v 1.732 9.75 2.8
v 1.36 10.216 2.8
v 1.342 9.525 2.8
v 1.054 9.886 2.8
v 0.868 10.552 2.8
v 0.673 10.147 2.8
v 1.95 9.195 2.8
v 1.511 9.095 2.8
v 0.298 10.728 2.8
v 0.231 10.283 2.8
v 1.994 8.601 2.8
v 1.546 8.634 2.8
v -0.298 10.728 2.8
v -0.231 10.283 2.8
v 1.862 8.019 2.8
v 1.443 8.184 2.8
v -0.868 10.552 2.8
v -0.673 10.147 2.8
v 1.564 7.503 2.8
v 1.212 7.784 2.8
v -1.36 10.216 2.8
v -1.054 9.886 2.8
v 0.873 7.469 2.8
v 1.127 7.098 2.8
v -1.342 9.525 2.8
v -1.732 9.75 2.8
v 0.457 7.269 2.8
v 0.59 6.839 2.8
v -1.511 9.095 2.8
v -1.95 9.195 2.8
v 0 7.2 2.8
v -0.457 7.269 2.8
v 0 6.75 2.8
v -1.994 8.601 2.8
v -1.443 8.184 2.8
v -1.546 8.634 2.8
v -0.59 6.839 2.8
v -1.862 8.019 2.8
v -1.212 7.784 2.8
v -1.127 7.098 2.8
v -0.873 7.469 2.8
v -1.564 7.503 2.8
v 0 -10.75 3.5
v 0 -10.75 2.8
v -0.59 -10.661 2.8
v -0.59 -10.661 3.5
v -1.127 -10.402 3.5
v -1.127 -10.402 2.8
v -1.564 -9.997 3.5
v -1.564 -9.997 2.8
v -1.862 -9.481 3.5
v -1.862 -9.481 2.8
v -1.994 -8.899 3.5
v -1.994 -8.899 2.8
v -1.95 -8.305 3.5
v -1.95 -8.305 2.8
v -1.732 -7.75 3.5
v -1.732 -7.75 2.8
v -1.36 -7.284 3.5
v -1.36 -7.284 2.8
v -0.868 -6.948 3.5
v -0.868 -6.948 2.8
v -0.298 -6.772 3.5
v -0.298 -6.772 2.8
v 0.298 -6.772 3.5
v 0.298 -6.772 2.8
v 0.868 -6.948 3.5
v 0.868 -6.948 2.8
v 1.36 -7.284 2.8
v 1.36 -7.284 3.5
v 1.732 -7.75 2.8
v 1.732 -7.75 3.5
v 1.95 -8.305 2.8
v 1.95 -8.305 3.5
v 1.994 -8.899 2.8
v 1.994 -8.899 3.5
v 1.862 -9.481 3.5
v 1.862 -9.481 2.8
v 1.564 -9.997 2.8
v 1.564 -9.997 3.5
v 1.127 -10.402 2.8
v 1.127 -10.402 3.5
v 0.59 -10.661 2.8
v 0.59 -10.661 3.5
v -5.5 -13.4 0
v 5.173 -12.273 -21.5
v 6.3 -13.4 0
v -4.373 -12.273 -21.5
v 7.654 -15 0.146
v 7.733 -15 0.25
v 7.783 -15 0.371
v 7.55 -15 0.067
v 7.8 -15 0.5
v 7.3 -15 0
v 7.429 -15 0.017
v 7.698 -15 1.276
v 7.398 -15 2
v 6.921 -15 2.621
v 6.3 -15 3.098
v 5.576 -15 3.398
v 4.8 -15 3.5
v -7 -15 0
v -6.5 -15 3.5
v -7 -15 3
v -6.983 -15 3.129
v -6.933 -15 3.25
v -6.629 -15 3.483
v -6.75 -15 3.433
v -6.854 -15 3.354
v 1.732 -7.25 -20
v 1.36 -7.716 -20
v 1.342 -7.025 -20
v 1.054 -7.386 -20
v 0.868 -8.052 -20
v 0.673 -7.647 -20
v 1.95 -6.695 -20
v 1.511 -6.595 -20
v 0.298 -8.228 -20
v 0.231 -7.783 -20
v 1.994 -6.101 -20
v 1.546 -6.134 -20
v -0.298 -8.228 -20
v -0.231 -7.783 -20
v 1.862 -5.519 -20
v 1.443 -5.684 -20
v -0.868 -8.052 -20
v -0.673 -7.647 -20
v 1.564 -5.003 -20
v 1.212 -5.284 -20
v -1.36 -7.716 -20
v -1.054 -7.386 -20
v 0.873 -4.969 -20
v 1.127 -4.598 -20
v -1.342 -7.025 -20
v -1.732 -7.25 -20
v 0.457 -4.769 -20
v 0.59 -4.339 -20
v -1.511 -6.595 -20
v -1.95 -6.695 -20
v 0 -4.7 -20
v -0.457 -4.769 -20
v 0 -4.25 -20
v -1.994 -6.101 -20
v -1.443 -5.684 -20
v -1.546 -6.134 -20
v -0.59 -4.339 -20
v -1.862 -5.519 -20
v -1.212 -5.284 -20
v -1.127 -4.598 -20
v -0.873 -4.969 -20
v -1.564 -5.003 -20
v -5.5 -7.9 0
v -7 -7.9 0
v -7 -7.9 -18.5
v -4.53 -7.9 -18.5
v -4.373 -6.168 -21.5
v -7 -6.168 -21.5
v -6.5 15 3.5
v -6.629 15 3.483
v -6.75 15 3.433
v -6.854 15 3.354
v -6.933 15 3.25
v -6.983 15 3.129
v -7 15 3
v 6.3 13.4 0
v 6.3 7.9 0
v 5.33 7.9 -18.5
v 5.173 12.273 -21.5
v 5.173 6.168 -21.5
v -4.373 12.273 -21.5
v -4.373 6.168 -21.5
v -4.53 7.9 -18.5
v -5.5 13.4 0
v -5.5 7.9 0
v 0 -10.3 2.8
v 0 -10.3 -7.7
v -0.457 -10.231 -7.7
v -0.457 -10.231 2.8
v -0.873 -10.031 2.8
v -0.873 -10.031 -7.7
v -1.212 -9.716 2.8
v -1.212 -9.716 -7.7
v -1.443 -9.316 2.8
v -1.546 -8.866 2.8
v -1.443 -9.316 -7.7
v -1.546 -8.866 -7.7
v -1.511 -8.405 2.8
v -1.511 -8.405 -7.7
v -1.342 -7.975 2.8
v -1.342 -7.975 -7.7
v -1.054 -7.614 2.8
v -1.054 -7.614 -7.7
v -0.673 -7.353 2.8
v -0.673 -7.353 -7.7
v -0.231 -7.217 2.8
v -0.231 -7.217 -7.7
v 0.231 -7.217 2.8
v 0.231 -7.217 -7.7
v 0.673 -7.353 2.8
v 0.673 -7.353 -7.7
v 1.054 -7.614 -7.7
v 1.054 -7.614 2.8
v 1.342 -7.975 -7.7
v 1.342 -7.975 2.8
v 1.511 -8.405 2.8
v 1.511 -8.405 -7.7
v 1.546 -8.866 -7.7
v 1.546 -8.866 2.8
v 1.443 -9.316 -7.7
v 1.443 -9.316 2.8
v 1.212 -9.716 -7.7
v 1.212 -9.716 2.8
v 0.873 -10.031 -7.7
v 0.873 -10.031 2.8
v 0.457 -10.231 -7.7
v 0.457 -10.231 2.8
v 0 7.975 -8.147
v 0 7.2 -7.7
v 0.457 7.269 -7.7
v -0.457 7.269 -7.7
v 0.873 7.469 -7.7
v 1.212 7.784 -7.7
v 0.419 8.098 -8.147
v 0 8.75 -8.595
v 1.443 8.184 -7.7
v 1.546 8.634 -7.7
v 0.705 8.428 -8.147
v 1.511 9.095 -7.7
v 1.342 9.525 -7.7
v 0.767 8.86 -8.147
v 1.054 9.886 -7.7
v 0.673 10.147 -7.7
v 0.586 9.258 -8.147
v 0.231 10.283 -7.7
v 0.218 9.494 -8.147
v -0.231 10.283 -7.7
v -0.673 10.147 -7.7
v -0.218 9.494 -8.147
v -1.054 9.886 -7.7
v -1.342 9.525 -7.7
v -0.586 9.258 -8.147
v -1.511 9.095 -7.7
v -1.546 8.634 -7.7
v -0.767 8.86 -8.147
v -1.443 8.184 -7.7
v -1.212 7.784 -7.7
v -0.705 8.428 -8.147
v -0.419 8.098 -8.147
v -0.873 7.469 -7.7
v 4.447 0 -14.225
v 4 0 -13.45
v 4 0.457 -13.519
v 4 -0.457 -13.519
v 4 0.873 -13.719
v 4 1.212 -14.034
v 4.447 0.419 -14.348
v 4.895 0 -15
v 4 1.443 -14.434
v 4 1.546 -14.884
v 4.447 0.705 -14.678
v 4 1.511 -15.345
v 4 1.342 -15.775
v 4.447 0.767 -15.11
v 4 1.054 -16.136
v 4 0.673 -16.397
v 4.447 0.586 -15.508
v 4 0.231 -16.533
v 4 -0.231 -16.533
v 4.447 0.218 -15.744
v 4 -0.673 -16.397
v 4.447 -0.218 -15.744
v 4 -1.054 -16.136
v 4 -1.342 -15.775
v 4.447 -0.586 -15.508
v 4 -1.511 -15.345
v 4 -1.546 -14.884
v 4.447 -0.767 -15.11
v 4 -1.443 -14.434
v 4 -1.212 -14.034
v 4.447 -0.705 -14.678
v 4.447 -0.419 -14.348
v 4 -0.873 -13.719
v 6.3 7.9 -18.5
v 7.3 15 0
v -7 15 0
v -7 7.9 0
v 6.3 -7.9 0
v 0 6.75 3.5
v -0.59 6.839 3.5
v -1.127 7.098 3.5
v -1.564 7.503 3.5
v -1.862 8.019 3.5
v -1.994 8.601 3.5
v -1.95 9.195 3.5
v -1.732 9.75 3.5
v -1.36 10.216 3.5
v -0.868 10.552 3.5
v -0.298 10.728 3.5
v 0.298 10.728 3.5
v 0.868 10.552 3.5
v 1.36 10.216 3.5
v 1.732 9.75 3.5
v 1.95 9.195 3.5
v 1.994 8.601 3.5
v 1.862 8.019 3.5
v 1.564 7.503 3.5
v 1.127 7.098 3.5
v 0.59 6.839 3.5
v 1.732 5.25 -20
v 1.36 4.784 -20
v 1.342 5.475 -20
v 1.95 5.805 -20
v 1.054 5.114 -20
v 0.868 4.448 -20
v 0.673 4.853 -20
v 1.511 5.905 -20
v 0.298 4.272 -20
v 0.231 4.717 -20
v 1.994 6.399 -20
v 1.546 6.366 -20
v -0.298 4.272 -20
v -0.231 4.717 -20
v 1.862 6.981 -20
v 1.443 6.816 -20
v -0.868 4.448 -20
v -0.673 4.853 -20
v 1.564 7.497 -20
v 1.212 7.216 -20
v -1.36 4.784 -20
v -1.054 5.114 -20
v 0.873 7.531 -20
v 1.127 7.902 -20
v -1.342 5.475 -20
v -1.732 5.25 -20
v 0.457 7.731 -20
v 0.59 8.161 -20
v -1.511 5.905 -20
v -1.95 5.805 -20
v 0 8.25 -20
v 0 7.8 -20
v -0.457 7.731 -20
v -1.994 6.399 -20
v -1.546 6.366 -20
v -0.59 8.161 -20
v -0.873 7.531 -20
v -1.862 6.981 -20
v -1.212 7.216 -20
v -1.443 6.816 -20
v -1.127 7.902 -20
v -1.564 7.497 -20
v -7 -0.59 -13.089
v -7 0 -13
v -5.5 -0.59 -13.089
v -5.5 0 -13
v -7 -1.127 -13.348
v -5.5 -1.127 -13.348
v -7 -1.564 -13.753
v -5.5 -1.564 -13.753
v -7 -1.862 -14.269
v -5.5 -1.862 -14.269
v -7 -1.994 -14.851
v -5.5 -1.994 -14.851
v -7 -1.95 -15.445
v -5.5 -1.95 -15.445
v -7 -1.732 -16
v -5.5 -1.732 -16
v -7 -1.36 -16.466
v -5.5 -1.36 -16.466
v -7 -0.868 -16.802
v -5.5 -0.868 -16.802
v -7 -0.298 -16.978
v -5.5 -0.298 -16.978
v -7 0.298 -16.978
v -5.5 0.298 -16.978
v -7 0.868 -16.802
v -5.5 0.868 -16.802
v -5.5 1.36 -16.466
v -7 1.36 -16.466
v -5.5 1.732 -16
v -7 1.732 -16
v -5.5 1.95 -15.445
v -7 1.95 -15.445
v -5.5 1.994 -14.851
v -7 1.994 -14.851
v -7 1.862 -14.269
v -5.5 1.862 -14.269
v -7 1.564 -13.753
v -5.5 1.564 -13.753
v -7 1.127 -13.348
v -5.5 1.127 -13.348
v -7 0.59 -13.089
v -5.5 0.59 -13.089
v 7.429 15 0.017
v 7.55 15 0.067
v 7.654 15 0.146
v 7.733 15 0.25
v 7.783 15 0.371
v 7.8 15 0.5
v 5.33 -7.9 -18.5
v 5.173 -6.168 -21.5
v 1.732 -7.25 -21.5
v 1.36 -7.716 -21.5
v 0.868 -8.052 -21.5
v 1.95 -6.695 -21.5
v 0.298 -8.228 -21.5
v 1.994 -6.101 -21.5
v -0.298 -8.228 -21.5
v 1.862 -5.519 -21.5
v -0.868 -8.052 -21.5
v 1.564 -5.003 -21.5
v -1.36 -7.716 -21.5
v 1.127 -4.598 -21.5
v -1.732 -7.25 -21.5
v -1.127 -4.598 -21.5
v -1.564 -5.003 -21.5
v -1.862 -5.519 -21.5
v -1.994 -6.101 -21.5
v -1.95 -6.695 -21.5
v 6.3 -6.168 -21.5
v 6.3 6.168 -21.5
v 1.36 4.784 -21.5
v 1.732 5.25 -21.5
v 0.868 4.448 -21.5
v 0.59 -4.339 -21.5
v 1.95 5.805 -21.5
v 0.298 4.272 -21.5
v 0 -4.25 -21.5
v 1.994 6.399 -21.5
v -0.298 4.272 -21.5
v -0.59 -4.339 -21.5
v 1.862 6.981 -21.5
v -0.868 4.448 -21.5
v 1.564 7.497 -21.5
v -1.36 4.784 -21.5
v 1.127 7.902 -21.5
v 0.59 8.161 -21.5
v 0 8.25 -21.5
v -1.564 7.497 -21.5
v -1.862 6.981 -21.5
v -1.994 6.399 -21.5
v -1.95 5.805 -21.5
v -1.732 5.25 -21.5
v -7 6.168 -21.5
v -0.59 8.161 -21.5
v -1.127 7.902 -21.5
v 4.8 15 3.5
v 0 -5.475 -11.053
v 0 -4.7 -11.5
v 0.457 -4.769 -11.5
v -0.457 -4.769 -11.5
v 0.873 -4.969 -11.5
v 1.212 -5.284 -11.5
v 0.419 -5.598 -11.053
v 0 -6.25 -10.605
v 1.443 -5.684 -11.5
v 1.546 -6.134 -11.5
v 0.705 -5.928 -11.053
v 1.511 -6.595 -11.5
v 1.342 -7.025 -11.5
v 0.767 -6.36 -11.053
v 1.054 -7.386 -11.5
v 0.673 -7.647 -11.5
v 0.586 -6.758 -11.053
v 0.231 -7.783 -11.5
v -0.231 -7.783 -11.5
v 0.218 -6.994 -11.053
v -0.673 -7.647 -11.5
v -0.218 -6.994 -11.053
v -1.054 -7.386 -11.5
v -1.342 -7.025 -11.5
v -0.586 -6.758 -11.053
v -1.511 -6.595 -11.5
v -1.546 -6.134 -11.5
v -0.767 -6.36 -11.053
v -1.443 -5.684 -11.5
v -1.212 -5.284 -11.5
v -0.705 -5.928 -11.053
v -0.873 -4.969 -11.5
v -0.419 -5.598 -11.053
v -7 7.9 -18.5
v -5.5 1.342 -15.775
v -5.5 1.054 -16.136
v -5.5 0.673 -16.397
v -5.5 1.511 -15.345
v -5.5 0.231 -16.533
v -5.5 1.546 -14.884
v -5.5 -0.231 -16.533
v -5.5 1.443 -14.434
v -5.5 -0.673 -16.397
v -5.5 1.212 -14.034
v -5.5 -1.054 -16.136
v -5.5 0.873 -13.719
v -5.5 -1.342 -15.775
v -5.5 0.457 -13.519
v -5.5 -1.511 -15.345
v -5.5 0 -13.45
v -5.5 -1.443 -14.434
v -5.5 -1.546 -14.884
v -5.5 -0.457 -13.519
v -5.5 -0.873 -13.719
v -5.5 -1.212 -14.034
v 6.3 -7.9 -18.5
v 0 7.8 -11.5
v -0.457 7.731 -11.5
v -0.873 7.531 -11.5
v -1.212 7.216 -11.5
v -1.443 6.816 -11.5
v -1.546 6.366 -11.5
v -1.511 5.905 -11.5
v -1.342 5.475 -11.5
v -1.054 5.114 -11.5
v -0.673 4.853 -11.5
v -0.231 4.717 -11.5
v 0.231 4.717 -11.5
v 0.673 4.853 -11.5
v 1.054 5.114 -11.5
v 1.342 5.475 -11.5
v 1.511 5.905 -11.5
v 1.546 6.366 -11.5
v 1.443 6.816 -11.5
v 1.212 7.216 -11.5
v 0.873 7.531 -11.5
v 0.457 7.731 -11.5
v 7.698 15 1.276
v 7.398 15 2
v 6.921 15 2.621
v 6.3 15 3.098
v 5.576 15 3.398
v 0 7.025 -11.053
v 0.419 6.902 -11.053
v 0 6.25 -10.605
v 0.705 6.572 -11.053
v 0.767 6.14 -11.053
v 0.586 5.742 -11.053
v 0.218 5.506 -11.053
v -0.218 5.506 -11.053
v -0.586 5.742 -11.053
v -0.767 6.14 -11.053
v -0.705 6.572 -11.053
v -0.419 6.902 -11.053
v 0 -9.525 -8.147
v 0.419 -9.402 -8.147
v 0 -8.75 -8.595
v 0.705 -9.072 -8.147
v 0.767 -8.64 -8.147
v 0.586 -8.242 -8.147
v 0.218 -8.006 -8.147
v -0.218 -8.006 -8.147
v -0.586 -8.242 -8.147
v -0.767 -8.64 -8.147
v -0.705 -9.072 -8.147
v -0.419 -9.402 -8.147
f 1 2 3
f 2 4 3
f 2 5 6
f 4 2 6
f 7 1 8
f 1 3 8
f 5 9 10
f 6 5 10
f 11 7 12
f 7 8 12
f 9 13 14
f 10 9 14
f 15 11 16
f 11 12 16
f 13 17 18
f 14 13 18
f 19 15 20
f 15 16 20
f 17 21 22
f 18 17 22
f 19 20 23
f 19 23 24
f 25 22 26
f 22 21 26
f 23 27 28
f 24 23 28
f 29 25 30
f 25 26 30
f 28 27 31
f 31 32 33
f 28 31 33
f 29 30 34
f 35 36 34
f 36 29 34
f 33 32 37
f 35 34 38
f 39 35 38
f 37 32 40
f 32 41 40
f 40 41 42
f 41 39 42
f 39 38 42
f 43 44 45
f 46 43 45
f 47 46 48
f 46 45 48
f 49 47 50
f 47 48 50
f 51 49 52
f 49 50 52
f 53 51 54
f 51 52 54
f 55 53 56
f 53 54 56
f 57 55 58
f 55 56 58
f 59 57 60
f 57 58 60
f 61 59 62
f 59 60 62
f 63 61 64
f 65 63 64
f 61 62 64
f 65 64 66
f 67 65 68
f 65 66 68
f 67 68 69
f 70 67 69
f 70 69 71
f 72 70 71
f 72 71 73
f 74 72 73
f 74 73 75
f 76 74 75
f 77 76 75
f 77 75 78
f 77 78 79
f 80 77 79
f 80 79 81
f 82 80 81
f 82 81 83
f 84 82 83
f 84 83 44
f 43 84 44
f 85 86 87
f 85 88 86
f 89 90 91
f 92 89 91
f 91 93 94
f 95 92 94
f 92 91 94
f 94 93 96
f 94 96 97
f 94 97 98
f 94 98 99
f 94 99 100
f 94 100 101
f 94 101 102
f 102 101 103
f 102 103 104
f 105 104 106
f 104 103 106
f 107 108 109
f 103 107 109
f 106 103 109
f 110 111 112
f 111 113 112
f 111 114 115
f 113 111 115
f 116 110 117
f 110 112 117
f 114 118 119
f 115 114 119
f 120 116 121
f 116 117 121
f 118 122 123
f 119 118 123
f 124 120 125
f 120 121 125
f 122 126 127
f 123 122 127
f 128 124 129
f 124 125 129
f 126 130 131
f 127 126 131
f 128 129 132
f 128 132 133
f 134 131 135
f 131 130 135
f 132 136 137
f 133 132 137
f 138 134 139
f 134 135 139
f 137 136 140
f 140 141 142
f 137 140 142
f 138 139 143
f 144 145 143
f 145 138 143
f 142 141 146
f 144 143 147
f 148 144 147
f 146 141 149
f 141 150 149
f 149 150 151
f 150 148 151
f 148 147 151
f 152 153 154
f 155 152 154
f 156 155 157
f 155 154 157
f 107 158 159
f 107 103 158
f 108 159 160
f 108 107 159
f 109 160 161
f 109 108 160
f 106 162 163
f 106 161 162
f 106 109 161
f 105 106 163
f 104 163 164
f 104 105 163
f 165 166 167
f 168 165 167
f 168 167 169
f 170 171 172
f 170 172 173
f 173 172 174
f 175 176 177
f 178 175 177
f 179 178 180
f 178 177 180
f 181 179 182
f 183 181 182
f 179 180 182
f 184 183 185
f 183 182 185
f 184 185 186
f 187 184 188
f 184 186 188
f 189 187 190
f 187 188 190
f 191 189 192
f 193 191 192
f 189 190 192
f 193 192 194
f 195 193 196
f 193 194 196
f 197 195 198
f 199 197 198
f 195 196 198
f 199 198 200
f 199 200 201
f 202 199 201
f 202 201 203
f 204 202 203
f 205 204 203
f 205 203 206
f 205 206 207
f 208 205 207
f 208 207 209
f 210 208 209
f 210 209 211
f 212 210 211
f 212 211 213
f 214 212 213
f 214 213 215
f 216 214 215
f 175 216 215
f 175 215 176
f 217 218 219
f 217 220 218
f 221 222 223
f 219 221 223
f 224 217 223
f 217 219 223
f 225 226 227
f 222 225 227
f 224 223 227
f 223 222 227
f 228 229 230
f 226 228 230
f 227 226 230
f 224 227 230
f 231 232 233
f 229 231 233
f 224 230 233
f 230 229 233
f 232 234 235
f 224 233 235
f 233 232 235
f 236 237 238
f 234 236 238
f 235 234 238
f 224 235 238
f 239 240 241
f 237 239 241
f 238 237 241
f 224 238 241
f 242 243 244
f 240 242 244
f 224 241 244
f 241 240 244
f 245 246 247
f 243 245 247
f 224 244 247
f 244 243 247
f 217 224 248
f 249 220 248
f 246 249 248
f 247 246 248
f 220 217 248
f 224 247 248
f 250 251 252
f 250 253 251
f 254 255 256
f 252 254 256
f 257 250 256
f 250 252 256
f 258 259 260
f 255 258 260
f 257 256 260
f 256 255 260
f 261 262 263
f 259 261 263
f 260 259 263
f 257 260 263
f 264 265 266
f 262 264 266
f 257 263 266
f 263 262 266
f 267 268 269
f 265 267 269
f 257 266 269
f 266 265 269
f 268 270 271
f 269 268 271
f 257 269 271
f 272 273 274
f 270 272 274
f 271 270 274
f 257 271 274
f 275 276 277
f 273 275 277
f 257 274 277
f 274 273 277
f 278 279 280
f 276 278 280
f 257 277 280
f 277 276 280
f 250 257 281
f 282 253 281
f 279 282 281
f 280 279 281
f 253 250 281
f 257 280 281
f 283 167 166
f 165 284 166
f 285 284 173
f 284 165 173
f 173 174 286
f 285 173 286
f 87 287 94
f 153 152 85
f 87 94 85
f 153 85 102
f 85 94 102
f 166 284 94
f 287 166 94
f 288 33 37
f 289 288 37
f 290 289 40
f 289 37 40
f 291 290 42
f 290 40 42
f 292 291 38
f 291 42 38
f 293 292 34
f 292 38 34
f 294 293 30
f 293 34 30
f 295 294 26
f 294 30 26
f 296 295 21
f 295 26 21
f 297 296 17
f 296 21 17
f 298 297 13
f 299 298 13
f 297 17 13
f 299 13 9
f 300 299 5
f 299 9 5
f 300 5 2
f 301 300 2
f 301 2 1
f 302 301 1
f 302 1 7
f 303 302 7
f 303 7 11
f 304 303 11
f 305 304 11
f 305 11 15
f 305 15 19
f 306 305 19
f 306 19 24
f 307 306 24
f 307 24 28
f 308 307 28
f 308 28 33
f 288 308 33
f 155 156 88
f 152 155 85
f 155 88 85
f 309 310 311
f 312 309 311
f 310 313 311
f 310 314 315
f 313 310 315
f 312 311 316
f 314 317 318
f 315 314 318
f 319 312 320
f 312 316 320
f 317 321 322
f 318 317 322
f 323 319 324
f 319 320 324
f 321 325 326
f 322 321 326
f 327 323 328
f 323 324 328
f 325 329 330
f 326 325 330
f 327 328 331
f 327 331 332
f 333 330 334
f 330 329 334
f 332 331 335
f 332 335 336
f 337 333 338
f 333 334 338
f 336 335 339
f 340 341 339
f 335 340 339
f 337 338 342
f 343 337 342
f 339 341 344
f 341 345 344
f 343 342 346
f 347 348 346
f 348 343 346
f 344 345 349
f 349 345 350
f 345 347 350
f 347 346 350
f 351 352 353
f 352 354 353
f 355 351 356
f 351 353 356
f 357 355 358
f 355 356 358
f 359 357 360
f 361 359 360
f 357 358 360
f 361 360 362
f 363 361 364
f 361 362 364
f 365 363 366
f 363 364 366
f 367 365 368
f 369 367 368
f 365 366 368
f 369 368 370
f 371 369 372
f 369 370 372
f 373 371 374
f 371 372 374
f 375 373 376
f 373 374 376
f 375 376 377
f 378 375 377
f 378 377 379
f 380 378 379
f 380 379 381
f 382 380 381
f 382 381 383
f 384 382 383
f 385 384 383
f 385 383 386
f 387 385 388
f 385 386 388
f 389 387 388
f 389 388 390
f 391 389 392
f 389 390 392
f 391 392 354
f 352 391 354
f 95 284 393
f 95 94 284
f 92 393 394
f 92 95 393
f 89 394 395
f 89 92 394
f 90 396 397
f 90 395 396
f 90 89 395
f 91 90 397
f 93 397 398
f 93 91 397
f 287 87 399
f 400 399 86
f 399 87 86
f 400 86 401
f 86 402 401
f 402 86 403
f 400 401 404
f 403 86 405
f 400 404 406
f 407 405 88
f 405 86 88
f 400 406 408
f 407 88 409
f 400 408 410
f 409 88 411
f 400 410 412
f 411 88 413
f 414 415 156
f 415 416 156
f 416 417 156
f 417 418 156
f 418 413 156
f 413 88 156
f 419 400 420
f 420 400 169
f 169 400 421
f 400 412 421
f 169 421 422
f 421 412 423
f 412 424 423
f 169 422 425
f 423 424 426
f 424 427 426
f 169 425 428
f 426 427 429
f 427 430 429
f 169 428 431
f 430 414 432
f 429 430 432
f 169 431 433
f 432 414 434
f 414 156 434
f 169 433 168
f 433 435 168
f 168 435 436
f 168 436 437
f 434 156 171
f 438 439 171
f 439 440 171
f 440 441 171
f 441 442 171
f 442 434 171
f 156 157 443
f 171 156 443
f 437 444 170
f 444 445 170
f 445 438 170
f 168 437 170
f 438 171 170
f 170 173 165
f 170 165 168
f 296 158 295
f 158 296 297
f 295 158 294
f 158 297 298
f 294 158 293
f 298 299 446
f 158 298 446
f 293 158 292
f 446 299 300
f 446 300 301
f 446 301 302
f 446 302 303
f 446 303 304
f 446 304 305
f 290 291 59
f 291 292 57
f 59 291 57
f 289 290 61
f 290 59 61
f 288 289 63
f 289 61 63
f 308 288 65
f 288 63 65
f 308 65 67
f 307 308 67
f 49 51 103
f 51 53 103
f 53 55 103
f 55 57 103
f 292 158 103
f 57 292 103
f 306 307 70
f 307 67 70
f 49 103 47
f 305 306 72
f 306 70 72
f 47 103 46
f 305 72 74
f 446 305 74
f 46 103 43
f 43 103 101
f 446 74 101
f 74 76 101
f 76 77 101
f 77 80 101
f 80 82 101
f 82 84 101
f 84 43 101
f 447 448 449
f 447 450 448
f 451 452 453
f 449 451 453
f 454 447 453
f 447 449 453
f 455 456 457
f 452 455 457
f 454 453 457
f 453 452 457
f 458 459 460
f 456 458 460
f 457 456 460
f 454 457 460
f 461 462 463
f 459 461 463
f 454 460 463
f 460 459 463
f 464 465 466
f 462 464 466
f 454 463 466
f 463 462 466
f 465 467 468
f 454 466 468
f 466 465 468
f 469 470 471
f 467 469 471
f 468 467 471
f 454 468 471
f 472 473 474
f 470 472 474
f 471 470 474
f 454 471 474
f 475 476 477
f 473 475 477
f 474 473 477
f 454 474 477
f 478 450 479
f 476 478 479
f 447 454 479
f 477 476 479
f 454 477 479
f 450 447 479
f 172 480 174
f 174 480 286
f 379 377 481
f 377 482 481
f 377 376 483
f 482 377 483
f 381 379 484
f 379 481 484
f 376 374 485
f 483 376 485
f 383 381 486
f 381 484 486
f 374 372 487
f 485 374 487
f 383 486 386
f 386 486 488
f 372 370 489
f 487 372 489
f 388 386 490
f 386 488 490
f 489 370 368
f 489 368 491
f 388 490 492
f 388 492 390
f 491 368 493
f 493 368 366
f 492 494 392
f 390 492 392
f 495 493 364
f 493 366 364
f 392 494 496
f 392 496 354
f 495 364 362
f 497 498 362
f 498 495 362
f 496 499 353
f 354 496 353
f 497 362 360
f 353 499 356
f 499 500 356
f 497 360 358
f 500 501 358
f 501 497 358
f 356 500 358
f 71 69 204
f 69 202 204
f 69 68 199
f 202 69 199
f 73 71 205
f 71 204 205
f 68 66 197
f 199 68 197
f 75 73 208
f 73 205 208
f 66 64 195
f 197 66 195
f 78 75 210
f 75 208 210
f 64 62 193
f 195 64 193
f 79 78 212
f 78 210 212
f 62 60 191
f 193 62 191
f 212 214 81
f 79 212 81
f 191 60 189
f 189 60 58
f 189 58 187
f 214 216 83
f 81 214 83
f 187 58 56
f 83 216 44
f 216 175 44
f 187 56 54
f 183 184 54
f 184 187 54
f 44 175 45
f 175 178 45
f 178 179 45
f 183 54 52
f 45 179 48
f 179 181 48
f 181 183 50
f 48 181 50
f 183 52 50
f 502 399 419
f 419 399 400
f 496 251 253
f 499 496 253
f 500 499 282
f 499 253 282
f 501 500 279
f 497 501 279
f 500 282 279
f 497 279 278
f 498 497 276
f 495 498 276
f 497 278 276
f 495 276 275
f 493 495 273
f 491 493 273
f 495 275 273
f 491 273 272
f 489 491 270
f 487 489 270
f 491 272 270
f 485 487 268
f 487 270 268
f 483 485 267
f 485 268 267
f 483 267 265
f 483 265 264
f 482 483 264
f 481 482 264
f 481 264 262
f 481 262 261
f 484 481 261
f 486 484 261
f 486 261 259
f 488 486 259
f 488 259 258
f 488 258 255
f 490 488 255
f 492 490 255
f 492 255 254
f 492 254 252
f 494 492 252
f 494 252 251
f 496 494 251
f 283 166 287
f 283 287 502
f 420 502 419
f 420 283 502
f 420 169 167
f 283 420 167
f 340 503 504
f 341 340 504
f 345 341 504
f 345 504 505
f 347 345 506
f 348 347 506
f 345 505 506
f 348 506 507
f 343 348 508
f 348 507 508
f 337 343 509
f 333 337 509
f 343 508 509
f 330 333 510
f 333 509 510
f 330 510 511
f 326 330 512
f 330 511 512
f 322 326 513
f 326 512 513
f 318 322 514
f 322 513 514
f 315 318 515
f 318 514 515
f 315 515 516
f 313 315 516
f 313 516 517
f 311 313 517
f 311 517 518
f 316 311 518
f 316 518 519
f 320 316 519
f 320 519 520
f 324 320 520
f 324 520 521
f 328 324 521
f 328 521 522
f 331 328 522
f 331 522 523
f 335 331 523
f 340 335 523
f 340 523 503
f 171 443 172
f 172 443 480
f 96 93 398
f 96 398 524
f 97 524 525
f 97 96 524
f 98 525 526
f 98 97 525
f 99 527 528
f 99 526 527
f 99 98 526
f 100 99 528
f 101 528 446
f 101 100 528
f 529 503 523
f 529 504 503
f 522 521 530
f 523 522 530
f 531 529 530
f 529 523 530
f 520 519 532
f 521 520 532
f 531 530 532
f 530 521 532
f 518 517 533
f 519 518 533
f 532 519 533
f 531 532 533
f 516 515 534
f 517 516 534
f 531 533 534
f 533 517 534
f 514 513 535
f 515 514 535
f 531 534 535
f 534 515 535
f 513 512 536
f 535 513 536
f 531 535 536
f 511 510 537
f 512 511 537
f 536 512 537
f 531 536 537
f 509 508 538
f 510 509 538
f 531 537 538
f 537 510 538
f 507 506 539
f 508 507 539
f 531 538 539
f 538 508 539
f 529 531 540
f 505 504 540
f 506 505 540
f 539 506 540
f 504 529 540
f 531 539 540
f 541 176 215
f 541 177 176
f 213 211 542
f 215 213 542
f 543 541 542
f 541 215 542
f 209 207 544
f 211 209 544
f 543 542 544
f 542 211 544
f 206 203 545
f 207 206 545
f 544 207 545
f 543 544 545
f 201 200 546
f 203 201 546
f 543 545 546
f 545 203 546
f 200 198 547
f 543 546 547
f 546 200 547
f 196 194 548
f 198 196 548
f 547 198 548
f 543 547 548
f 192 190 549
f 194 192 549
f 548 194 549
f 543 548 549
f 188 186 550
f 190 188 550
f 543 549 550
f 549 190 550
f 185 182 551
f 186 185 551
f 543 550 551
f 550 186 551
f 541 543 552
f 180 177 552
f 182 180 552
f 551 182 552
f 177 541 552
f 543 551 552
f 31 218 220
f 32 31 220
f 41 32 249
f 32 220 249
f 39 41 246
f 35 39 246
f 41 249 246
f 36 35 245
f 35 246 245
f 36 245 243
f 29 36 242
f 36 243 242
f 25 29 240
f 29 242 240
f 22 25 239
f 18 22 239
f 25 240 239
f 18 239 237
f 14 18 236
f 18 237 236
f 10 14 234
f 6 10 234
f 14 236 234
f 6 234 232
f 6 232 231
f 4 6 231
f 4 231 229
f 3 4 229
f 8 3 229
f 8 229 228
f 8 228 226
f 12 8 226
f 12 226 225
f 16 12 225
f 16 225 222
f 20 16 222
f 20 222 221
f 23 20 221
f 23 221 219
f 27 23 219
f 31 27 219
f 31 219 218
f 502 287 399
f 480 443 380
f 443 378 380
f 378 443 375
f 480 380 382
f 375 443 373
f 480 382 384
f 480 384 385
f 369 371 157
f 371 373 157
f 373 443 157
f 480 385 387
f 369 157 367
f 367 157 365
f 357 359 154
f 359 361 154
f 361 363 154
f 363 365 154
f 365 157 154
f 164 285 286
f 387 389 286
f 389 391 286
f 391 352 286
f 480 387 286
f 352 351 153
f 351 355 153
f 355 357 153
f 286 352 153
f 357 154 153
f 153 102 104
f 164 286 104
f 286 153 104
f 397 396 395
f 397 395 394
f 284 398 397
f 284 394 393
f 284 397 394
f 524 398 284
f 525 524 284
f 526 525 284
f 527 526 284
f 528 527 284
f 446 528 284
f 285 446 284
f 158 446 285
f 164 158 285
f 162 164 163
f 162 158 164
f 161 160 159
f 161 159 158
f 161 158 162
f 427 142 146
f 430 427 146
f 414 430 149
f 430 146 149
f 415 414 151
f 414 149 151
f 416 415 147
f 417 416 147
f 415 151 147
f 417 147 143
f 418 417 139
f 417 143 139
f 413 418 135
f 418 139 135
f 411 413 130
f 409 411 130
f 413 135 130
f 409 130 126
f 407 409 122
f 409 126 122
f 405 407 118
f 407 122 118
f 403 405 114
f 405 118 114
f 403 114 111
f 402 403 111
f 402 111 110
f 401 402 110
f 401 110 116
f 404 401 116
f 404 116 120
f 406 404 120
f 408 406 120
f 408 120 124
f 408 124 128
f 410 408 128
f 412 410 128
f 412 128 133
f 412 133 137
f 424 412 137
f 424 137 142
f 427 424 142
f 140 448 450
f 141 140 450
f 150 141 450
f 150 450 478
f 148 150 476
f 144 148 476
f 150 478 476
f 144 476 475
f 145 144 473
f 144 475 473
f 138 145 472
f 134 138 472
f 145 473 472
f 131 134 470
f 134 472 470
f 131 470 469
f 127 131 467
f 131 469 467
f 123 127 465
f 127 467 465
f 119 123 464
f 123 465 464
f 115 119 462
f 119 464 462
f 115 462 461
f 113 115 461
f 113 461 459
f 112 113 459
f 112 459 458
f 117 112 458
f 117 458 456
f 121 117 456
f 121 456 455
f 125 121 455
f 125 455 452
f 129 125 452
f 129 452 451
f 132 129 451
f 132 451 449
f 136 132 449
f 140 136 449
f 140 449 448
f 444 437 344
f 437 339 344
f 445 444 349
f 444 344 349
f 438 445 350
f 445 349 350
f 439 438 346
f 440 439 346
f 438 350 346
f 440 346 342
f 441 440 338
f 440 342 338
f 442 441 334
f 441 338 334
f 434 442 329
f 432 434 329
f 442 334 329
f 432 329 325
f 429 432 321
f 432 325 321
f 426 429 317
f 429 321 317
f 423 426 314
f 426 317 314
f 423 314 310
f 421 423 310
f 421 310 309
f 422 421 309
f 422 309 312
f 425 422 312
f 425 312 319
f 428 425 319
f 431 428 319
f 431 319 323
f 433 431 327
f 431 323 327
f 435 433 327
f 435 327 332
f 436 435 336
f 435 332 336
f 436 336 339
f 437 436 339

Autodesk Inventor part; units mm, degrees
sketch "Sketch_1" plane through (0, 0, 0) normal (0, 1, 0) x (-1, 0, 0)
  line L0 (5.5, 0) -> (-6.3, 0)
  line L1 (-6.3, 0) -> (-5.1732, -21.5)
  line L2 (-5.1732, -21.5) -> (4.3732, -21.5)
  line L3 (4.3732, -21.5) -> (5.5, 0)
extrude "Extrusion1" add sketch "Sketch_1" along normal mid plane 26.8
sketch "Sketch_2" plane through (0, 0, 0) normal (1, 0, 0) x (0, 1, 0)
  line L0 (13.4, 0) -> (12.2732, -21.5)
  line L1 (12.2732, -21.5) -> (-12.2732, -21.5)
  line L2 (-12.2732, -21.5) -> (-13.4, 0)
  line L3 (-13.4, 0) -> (-15, 0)
  line L4 (-15, 0) -> (-15, -25)
  line L5 (-15, -25) -> (15, -25)
  line L6 (15, -25) -> (15, 0)
  line L7 (15, 0) -> (13.4, 0)
extrude "Extrusion2" cut sketch "Sketch_2" along normal mid plane 13
sketch "Sketch_3" plane through (-7, 0, 0) normal (1, 0, 0) x (0, 0, -1)
  line L0 (0, -7.9) -> (18.5, -7.9)
  line L1 (18.5, -7.9) -> (21.5, -6.1679)
  line L2 (21.5, -6.1679) -> (21.5, 6.1679)
  line L3 (21.5, 6.1679) -> (18.5, 7.9)
  line L4 (18.5, 7.9) -> (0, 7.9)
  line L5 (0, 7.9) -> (0, -7.9)
extrude "Extrusion3" add sketch "Sketch_3" along normal blind 13.3
sketch "Sketch_4" plane through (0, 0, 0) normal (0, 1, 0) x (-1, 0, 0)
  line L0 (7, 0) -> (7, 3)
  arc A0 (7, 3) -> (6.5, 3.5) centre (6.5, 3) ccw
  line L1 (6.5, 3.5) -> (-4.8, 3.5)
  arc A1 (-4.8, 3.5) -> (-7.8, 0.5) centre (-4.8, 0.5) ccw
  arc A2 (-7.8, 0.5) -> (-7.3, 0) centre (-7.3, 0.5) ccw
  line L2 (-7.3, 0) -> (7, 0)
extrude "Extrusion4" add sketch "Sketch_4" along normal mid plane 30
sketch "Sketch5" plane through (-6.5, 15, 3.5) normal (0, 0, 1) x (1, 0, 0)
  point P0 (6.5, -6.25)
hole "Drilling 1" at (0, 8.75, 3.5) direction (0, 0, -1) diameter 3.1 depth 11.2 tip angle 120 counterbore diameter 4 counterbore depth 0.7
sketch "Sketch6" plane through (-6.5, 15, 3.5) normal (0, 0, 1) x (1, 0, 0)
  point P0 (6.5, -23.75)
hole "Drilling 2" at (0, -8.75, 3.5) direction (0, 0, -1) diameter 3.1 depth 11.2 tip angle 120 counterbore diameter 4 counterbore depth 0.7
sketch "Sketch7" plane through (5.1732, 12.2732, -21.5) normal (0, 0, -1) x (-1, 0, 0)
  point P0 (5.1732, -6.0232)
hole "Drilling 3" at (0, 6.25, -21.5) direction (0, 0, 1) diameter 3.1 depth 10 tip angle 120 counterbore diameter 4 counterbore depth 1.5
sketch "Sketch8" plane through (5.1732, 12.2732, -21.5) normal (0, 0, -1) x (-1, 0, 0)
  point P0 (5.1732, -18.5232)
hole "Drilling 4" at (0, -6.25, -21.5) direction (0, 0, 1) diameter 3.1 depth 10 tip angle 120 counterbore diameter 4 counterbore depth 1.5
sketch "Sketch9" plane through (-7, 0, 0) normal (-1, 0, 0) x (0, 0, 1)
  point P0 (-15, 0)
hole "Drilling 5" at (-7, 0, -15) direction (1, 0, 0) diameter 3.1 depth 11 tip angle 120 counterbore diameter 4 counterbore depth 1.5
ref_plane "montageblocke_XY" through (0, -8.75, 3.5) normal (0, 0, 1) x (1, 0, 0)
ref_plane "montageblocke_YZ" through (0, -8.75, 3.5) normal (1, 0, 0) x (0, 1, 0)
ref_plane "montageblocke_ZX" through (0, -8.75, 3.5) normal (0, 1, 0) x (0, 0, 1)
ref_plane "montageblocke_2_XY" through (0, 8.75, 3.5) normal (0, 0, 1) x (1, 0, 0)
ref_plane "montageblocke_2_YZ" through (0, 8.75, 3.5) normal (1, 0, 0) x (0, 1, 0)
ref_plane "montageblocke_2_ZX" through (0, 8.75, 3.5) normal (0, 1, 0) x (0, 0, 1)
properties part number "1XXX.500_Montageblocke"
